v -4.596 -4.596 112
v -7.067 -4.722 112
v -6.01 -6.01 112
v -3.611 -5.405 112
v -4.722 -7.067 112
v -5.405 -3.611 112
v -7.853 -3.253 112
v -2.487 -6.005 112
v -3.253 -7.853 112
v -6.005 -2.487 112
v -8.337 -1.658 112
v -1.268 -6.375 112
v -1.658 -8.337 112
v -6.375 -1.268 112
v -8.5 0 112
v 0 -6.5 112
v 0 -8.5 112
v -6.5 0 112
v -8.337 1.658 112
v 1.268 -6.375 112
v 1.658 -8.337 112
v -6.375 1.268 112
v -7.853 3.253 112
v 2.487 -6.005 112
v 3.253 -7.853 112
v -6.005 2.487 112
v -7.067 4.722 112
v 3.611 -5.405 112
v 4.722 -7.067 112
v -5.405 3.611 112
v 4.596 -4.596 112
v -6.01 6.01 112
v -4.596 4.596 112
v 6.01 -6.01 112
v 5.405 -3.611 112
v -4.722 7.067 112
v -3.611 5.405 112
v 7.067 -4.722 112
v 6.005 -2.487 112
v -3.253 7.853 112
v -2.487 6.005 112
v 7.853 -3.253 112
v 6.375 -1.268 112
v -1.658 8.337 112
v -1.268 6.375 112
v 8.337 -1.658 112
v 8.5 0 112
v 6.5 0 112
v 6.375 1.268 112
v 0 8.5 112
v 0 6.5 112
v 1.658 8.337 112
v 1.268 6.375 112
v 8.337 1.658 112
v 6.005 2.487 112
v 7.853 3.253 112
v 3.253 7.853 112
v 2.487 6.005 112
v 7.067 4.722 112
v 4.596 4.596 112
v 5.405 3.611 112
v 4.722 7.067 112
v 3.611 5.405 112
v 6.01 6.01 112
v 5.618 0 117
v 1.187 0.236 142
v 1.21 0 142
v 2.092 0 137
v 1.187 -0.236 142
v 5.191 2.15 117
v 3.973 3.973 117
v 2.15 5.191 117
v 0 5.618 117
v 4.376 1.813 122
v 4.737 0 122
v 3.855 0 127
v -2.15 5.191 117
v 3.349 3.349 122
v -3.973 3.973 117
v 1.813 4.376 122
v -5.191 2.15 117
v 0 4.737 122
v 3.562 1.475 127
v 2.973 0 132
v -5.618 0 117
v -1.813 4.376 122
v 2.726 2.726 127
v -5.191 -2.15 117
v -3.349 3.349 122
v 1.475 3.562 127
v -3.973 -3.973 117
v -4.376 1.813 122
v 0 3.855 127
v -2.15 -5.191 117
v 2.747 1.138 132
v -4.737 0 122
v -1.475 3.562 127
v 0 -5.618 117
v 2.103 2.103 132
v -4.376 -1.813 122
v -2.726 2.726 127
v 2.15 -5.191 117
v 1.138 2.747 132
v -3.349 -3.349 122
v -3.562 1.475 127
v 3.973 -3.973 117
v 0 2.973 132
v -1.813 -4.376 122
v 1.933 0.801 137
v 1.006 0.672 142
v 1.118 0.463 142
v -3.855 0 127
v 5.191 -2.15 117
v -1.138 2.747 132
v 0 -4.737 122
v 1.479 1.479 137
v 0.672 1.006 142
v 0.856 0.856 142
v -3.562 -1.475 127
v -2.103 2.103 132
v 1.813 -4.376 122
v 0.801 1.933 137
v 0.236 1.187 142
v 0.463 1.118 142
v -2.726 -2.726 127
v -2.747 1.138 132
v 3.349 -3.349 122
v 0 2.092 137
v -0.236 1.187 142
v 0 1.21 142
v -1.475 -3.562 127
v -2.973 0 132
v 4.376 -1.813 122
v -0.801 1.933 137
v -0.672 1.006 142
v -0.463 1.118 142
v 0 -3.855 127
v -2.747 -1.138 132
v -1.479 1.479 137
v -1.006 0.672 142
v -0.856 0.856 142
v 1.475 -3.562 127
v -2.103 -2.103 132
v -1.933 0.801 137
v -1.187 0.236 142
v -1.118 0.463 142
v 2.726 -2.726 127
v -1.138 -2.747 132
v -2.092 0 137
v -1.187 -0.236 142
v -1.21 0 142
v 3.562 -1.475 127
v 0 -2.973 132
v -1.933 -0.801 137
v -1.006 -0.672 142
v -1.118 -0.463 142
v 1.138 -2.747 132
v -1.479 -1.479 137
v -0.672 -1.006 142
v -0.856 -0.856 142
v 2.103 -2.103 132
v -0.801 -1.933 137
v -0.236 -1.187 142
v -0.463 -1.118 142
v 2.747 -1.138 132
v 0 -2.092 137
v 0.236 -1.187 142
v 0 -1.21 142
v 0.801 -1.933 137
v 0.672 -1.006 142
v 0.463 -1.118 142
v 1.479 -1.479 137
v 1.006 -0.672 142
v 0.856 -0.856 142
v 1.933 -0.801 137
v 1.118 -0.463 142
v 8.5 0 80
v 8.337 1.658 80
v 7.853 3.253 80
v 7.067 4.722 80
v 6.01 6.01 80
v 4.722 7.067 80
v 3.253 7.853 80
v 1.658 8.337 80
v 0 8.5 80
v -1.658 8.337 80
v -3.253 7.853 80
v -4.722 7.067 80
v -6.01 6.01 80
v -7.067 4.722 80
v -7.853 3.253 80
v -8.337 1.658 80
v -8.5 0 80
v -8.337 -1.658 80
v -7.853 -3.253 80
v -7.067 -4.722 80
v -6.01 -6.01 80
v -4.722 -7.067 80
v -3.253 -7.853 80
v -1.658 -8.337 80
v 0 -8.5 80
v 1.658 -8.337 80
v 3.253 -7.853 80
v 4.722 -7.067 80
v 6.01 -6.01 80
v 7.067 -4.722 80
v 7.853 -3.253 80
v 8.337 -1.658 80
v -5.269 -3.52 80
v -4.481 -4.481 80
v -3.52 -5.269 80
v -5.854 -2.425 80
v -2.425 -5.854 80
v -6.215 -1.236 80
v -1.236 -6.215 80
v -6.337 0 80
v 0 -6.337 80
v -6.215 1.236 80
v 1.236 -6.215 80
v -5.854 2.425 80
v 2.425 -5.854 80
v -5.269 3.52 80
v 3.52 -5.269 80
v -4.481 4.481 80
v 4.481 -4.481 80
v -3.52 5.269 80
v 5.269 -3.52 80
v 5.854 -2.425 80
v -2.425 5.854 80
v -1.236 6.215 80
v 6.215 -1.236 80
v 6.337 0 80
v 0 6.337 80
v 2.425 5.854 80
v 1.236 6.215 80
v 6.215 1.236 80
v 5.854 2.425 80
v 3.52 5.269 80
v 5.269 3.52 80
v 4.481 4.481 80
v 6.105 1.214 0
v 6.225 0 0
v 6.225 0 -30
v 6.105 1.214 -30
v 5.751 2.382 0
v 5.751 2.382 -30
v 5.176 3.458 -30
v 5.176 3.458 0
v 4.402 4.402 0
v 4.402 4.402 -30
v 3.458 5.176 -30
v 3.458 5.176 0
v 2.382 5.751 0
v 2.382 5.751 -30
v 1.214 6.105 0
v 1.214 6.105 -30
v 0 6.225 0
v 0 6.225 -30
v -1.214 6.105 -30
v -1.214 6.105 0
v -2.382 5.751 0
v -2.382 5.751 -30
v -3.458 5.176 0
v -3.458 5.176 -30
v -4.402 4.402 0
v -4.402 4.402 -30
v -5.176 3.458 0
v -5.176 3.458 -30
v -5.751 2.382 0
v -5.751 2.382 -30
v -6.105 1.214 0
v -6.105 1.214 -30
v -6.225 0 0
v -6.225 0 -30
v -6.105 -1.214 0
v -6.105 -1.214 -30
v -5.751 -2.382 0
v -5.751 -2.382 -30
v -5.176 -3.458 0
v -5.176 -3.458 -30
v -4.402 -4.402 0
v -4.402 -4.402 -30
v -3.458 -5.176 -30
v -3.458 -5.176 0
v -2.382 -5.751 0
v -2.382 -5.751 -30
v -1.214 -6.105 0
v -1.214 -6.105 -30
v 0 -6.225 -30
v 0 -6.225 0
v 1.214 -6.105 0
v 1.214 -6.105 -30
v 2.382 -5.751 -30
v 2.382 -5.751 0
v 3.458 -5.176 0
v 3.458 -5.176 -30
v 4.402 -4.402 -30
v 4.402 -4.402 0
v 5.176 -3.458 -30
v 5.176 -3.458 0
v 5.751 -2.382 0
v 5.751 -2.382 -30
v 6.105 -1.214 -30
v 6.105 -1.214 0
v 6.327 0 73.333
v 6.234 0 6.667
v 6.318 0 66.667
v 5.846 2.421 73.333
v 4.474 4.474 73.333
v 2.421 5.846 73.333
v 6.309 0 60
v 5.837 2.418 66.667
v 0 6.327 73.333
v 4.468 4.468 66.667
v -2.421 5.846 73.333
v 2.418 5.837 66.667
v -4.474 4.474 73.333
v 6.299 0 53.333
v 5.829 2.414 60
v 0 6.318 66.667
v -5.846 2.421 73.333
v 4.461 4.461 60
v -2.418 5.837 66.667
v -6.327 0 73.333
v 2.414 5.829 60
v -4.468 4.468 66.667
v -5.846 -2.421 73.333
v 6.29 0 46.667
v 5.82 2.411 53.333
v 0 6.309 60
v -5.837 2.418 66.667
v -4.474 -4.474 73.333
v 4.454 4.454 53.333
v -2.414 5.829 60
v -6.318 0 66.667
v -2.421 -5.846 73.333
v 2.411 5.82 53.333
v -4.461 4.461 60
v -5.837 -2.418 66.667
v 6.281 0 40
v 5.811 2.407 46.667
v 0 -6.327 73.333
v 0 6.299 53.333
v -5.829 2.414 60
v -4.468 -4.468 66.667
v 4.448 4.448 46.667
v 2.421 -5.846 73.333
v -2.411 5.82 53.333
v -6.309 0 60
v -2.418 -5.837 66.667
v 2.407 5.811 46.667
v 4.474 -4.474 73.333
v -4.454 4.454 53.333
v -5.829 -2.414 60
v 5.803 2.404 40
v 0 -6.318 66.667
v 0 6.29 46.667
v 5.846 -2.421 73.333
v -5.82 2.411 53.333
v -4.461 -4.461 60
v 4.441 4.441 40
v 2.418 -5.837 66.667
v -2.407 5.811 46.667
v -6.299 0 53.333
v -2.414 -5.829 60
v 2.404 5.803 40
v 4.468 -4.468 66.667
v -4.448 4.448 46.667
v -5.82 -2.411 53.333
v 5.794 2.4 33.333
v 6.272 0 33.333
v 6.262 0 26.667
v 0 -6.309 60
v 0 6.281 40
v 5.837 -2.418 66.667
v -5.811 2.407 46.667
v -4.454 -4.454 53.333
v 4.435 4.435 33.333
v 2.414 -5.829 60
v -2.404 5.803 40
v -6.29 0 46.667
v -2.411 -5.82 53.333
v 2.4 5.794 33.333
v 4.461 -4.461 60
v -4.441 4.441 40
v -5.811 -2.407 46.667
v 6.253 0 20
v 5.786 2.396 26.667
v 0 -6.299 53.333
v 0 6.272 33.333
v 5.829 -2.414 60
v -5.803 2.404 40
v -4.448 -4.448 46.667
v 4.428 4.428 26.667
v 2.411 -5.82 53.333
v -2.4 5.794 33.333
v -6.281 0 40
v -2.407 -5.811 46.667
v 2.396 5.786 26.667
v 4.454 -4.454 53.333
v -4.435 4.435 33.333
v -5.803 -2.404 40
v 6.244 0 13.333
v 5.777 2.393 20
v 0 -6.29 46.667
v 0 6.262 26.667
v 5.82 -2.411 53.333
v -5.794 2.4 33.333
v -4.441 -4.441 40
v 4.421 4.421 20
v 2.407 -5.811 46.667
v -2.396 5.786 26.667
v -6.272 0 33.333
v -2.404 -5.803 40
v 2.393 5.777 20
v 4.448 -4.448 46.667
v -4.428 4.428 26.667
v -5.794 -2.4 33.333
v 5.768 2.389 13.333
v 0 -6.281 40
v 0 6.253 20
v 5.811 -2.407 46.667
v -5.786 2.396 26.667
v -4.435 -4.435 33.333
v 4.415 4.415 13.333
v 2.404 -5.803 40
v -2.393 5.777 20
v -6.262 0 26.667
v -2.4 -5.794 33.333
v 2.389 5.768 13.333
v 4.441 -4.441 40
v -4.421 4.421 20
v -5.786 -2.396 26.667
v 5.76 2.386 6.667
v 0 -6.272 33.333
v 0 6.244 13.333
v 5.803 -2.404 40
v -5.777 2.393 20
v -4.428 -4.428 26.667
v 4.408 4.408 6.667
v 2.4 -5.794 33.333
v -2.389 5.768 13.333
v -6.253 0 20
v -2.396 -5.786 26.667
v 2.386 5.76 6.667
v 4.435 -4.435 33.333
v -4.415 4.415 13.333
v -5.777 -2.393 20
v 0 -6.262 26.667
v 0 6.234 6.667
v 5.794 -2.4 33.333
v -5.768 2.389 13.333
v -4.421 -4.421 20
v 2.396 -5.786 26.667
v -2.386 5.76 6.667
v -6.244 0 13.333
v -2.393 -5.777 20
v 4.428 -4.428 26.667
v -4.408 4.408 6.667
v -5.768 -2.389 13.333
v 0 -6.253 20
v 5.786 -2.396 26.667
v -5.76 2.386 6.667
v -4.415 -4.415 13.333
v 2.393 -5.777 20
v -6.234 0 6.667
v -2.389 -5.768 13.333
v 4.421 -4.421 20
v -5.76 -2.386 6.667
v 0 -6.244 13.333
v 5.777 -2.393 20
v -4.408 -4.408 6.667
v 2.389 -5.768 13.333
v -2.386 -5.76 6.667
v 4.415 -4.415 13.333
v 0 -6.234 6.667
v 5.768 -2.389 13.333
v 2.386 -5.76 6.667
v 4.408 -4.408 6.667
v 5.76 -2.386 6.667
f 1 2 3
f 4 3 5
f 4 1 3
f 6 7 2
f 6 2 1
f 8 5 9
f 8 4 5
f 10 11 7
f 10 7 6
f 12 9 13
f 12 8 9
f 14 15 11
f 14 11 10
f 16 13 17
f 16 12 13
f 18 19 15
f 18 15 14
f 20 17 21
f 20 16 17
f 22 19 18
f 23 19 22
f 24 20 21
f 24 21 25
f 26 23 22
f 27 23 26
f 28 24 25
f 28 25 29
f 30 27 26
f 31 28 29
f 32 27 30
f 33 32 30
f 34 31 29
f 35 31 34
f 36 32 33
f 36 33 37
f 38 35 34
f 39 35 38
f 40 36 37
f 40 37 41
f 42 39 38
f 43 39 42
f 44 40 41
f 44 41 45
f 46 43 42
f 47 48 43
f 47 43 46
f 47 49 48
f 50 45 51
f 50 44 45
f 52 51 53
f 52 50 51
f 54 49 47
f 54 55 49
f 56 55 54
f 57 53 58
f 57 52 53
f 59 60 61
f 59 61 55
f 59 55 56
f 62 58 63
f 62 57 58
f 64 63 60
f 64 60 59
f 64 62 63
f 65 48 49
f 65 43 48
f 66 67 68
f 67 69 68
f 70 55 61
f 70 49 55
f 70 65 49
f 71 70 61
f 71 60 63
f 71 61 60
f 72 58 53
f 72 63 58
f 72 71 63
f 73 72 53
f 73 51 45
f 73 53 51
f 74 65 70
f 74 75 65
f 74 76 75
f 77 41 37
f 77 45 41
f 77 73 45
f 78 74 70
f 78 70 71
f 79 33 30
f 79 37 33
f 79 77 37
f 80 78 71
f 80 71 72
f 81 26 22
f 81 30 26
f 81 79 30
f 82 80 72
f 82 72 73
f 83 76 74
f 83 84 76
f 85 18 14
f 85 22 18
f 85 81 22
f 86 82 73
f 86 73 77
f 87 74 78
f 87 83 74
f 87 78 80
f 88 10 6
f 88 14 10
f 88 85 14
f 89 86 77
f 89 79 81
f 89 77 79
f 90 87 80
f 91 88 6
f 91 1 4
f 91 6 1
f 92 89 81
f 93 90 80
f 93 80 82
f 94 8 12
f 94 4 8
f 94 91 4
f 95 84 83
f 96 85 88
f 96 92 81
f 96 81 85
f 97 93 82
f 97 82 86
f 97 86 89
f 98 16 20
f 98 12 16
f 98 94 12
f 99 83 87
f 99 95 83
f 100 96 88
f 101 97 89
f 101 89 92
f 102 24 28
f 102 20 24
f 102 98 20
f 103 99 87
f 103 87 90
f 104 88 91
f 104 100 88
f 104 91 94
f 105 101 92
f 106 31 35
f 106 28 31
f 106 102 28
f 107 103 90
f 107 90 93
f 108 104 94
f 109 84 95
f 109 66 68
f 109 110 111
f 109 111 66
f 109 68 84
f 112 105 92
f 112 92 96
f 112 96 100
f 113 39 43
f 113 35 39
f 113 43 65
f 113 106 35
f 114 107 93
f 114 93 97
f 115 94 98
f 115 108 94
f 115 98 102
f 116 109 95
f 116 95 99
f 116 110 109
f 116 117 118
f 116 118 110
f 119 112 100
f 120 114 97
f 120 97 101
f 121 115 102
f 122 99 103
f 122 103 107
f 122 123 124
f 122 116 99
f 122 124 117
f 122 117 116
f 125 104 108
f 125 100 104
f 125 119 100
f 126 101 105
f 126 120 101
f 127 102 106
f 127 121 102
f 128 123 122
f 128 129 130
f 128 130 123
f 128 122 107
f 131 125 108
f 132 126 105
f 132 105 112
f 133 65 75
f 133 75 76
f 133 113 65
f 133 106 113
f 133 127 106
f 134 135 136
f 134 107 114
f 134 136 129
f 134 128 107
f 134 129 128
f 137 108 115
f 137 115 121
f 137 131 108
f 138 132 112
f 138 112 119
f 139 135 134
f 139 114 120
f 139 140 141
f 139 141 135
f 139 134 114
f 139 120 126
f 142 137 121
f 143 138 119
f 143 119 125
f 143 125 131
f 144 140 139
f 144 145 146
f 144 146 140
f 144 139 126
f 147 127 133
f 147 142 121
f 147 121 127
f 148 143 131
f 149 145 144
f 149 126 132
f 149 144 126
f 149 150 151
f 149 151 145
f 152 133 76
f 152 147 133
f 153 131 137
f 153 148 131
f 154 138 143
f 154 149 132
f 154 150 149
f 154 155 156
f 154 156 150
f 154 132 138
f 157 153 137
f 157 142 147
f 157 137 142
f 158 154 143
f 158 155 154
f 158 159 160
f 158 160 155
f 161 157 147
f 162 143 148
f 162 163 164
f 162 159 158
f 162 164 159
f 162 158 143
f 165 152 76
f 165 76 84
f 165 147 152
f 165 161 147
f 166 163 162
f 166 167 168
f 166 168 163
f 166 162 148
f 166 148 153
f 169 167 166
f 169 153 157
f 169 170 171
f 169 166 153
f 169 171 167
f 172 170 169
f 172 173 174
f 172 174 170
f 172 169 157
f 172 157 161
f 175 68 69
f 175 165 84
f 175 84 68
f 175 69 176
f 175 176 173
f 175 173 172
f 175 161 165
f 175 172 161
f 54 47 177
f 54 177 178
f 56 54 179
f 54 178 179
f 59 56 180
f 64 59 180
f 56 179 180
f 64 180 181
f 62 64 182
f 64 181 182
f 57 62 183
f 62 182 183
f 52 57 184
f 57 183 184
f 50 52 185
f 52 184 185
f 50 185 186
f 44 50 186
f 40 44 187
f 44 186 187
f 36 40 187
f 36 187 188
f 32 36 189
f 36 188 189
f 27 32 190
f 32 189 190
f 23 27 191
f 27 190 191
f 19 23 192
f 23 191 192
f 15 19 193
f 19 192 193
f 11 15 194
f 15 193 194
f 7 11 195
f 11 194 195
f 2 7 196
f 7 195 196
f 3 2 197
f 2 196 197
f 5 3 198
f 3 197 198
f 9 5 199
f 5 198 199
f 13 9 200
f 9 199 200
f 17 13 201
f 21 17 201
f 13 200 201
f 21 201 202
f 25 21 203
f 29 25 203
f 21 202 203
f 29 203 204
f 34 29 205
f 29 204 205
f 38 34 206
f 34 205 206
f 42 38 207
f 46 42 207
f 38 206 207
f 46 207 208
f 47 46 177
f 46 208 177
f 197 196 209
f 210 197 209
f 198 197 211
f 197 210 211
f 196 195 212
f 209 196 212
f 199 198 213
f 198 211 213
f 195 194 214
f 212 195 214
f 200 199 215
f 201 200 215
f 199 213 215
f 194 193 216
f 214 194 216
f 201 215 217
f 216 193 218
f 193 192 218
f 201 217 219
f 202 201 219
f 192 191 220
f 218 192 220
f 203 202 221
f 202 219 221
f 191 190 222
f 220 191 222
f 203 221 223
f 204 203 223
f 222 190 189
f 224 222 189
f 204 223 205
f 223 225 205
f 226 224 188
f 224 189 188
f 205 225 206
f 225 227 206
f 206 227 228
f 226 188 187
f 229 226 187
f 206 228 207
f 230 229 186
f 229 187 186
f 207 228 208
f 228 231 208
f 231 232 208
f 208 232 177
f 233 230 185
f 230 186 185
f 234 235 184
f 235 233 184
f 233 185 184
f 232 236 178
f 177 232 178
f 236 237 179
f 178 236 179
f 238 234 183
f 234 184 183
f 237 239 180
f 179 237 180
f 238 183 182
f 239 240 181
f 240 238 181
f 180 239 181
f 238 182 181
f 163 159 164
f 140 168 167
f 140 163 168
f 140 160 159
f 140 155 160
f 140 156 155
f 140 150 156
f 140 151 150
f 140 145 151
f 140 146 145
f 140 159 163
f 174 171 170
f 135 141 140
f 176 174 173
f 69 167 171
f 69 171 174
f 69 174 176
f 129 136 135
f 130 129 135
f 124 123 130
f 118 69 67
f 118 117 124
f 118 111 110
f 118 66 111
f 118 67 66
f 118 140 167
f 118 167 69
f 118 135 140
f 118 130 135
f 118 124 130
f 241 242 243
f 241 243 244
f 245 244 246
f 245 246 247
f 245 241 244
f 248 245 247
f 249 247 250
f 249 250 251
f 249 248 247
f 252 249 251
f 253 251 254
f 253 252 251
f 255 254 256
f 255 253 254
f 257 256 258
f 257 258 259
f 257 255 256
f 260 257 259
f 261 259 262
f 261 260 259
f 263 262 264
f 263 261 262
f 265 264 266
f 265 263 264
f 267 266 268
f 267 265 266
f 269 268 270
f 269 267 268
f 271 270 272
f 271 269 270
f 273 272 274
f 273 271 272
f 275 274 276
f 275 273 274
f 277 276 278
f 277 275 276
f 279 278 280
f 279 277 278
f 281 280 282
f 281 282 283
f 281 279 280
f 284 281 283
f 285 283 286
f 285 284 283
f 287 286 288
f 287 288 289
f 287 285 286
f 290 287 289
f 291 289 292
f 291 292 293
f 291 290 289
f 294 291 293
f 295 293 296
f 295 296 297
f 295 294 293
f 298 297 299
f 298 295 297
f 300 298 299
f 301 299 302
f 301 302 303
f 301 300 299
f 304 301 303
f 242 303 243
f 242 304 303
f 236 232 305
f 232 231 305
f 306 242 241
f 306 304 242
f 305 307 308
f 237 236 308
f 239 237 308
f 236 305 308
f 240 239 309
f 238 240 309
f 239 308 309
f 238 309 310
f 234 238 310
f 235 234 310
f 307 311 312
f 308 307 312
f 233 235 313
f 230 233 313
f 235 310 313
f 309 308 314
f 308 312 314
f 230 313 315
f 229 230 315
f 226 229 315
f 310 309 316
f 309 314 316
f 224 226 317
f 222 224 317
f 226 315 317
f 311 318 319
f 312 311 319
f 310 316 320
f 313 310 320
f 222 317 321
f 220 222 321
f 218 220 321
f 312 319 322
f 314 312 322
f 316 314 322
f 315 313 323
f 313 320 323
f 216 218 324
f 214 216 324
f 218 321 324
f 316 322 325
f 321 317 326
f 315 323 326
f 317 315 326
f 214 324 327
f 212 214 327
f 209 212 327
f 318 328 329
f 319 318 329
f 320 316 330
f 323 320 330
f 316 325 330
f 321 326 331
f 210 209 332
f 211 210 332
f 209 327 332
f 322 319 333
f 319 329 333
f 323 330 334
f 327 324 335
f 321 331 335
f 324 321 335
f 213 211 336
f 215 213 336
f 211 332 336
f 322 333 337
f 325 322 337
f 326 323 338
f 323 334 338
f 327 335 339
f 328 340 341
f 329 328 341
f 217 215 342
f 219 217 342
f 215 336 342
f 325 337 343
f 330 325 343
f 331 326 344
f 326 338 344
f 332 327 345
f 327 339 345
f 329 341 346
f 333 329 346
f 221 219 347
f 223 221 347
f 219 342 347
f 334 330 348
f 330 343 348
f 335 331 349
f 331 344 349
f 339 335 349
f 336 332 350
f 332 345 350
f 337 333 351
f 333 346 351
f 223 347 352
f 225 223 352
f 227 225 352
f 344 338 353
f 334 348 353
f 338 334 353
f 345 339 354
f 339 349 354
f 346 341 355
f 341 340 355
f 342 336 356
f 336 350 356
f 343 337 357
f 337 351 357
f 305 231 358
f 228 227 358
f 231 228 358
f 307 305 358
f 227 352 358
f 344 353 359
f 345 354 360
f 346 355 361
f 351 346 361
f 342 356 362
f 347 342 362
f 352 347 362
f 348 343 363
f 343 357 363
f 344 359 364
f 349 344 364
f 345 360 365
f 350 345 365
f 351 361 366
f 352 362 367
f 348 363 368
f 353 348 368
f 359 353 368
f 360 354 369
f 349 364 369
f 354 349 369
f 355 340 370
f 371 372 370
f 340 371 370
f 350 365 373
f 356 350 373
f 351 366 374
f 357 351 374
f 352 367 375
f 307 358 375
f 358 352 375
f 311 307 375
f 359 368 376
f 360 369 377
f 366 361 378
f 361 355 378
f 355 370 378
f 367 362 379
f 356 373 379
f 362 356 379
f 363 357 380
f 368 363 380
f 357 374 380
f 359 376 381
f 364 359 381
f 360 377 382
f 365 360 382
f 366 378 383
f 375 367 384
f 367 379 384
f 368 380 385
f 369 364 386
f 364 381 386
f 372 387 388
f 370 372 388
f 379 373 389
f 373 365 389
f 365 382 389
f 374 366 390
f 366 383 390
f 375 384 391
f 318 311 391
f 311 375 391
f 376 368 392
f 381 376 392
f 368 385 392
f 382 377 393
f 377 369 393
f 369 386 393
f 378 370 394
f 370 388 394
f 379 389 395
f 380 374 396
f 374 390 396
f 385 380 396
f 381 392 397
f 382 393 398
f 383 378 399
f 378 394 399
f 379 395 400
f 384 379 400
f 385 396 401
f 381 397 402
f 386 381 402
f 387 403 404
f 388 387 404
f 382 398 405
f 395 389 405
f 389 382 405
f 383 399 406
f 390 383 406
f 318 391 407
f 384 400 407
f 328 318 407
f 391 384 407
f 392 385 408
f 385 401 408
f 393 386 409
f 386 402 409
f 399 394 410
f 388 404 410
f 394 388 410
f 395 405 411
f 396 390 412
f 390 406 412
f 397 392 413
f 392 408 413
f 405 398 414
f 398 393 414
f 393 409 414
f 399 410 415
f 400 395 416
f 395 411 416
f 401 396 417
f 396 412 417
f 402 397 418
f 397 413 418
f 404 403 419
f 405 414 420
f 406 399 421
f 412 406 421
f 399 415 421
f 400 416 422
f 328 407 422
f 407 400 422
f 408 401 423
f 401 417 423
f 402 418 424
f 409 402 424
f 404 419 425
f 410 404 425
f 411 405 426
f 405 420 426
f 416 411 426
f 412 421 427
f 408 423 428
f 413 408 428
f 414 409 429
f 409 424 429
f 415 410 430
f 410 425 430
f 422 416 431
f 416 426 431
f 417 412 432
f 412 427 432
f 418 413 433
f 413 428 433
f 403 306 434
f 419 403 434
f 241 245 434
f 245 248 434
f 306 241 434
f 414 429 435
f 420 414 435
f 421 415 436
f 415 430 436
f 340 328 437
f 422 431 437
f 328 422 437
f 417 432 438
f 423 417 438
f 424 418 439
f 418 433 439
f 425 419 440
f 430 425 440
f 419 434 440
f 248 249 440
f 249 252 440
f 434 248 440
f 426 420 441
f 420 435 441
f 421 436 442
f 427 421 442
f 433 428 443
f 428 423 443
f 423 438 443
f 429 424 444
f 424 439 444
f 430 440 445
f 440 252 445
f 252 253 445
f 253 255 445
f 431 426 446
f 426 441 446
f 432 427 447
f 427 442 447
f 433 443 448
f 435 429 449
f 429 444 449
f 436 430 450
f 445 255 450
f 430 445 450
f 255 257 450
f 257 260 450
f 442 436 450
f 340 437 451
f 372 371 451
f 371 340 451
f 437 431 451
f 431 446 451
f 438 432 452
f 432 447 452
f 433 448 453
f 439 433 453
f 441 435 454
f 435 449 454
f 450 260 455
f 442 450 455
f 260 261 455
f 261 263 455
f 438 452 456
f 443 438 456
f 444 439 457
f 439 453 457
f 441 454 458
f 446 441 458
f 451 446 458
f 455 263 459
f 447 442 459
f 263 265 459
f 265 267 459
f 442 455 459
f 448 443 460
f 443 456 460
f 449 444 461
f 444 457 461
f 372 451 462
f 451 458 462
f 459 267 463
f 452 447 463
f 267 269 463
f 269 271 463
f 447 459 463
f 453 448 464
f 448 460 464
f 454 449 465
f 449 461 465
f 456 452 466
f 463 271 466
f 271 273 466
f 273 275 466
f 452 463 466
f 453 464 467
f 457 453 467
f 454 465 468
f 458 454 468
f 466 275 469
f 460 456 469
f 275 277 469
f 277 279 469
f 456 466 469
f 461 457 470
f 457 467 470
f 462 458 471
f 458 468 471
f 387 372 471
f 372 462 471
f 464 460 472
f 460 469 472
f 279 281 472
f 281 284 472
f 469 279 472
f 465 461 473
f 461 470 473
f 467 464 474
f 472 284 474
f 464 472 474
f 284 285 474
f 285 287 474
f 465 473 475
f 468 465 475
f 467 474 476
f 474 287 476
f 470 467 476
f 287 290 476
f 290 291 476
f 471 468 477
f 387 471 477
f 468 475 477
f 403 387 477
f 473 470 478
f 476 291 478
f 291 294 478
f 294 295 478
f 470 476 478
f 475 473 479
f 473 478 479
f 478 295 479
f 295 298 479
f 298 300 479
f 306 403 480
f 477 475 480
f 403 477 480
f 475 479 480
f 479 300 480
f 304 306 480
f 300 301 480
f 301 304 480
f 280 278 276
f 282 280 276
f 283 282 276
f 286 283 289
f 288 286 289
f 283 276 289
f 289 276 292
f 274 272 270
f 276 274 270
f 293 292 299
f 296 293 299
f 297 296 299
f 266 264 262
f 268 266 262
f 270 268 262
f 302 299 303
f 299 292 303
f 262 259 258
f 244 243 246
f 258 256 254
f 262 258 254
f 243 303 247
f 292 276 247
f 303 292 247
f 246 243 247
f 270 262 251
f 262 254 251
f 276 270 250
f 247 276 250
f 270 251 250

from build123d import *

# Parameters (mm, degrees)
SKETCH1_R           = 6.225
BOSS_EXTRUDE1_DEPTH = 80
BOSS_EXTRUDE1_DRAFT = -0.08
SKETCH1_2_R         = 6.225
BOSS_EXTRUDE2_DEPTH = 30
SKETCH2_R           = 8.5
BOSS_EXTRUDE3_DEPTH = 32
SKETCH3_R           = 6.5
BOSS_EXTRUDE4_DEPTH = 30
BOSS_EXTRUDE4_TAPER = 10


with BuildPart() as part:
    # Sketch1 → Boss-Extrude1 (with draft: the straight prism first)
    with BuildSketch(Plane.XY):
        Circle(SKETCH1_R)
    extrude(amount=BOSS_EXTRUDE1_DEPTH)
    # Boss-Extrude1: the draft: its side faces are tilted about the plane it starts from
    boss_extrude1_sides = [part.faces().sort_by_distance(p)[0] for p in [
        (-6.225, 0, 40),
    ]]
    draft(boss_extrude1_sides, Plane.XY, BOSS_EXTRUDE1_DRAFT)

    # Sketch1<2> → Boss-Extrude2 (add)
    with BuildSketch(Plane.XY):
        Circle(SKETCH1_2_R)
    extrude(amount=-BOSS_EXTRUDE2_DEPTH)

    # Sketch2 → Boss-Extrude3 (add)
    with BuildSketch(Plane.XY.offset(80)):
        Circle(SKETCH2_R)
    extrude(amount=BOSS_EXTRUDE3_DEPTH)

    # Sketch3 → Boss-Extrude4 (add)
    with BuildSketch(Plane.XY.offset(112)):
        Circle(SKETCH3_R)
    extrude(amount=BOSS_EXTRUDE4_DEPTH, taper=BOSS_EXTRUDE4_TAPER)


solid = part.part
